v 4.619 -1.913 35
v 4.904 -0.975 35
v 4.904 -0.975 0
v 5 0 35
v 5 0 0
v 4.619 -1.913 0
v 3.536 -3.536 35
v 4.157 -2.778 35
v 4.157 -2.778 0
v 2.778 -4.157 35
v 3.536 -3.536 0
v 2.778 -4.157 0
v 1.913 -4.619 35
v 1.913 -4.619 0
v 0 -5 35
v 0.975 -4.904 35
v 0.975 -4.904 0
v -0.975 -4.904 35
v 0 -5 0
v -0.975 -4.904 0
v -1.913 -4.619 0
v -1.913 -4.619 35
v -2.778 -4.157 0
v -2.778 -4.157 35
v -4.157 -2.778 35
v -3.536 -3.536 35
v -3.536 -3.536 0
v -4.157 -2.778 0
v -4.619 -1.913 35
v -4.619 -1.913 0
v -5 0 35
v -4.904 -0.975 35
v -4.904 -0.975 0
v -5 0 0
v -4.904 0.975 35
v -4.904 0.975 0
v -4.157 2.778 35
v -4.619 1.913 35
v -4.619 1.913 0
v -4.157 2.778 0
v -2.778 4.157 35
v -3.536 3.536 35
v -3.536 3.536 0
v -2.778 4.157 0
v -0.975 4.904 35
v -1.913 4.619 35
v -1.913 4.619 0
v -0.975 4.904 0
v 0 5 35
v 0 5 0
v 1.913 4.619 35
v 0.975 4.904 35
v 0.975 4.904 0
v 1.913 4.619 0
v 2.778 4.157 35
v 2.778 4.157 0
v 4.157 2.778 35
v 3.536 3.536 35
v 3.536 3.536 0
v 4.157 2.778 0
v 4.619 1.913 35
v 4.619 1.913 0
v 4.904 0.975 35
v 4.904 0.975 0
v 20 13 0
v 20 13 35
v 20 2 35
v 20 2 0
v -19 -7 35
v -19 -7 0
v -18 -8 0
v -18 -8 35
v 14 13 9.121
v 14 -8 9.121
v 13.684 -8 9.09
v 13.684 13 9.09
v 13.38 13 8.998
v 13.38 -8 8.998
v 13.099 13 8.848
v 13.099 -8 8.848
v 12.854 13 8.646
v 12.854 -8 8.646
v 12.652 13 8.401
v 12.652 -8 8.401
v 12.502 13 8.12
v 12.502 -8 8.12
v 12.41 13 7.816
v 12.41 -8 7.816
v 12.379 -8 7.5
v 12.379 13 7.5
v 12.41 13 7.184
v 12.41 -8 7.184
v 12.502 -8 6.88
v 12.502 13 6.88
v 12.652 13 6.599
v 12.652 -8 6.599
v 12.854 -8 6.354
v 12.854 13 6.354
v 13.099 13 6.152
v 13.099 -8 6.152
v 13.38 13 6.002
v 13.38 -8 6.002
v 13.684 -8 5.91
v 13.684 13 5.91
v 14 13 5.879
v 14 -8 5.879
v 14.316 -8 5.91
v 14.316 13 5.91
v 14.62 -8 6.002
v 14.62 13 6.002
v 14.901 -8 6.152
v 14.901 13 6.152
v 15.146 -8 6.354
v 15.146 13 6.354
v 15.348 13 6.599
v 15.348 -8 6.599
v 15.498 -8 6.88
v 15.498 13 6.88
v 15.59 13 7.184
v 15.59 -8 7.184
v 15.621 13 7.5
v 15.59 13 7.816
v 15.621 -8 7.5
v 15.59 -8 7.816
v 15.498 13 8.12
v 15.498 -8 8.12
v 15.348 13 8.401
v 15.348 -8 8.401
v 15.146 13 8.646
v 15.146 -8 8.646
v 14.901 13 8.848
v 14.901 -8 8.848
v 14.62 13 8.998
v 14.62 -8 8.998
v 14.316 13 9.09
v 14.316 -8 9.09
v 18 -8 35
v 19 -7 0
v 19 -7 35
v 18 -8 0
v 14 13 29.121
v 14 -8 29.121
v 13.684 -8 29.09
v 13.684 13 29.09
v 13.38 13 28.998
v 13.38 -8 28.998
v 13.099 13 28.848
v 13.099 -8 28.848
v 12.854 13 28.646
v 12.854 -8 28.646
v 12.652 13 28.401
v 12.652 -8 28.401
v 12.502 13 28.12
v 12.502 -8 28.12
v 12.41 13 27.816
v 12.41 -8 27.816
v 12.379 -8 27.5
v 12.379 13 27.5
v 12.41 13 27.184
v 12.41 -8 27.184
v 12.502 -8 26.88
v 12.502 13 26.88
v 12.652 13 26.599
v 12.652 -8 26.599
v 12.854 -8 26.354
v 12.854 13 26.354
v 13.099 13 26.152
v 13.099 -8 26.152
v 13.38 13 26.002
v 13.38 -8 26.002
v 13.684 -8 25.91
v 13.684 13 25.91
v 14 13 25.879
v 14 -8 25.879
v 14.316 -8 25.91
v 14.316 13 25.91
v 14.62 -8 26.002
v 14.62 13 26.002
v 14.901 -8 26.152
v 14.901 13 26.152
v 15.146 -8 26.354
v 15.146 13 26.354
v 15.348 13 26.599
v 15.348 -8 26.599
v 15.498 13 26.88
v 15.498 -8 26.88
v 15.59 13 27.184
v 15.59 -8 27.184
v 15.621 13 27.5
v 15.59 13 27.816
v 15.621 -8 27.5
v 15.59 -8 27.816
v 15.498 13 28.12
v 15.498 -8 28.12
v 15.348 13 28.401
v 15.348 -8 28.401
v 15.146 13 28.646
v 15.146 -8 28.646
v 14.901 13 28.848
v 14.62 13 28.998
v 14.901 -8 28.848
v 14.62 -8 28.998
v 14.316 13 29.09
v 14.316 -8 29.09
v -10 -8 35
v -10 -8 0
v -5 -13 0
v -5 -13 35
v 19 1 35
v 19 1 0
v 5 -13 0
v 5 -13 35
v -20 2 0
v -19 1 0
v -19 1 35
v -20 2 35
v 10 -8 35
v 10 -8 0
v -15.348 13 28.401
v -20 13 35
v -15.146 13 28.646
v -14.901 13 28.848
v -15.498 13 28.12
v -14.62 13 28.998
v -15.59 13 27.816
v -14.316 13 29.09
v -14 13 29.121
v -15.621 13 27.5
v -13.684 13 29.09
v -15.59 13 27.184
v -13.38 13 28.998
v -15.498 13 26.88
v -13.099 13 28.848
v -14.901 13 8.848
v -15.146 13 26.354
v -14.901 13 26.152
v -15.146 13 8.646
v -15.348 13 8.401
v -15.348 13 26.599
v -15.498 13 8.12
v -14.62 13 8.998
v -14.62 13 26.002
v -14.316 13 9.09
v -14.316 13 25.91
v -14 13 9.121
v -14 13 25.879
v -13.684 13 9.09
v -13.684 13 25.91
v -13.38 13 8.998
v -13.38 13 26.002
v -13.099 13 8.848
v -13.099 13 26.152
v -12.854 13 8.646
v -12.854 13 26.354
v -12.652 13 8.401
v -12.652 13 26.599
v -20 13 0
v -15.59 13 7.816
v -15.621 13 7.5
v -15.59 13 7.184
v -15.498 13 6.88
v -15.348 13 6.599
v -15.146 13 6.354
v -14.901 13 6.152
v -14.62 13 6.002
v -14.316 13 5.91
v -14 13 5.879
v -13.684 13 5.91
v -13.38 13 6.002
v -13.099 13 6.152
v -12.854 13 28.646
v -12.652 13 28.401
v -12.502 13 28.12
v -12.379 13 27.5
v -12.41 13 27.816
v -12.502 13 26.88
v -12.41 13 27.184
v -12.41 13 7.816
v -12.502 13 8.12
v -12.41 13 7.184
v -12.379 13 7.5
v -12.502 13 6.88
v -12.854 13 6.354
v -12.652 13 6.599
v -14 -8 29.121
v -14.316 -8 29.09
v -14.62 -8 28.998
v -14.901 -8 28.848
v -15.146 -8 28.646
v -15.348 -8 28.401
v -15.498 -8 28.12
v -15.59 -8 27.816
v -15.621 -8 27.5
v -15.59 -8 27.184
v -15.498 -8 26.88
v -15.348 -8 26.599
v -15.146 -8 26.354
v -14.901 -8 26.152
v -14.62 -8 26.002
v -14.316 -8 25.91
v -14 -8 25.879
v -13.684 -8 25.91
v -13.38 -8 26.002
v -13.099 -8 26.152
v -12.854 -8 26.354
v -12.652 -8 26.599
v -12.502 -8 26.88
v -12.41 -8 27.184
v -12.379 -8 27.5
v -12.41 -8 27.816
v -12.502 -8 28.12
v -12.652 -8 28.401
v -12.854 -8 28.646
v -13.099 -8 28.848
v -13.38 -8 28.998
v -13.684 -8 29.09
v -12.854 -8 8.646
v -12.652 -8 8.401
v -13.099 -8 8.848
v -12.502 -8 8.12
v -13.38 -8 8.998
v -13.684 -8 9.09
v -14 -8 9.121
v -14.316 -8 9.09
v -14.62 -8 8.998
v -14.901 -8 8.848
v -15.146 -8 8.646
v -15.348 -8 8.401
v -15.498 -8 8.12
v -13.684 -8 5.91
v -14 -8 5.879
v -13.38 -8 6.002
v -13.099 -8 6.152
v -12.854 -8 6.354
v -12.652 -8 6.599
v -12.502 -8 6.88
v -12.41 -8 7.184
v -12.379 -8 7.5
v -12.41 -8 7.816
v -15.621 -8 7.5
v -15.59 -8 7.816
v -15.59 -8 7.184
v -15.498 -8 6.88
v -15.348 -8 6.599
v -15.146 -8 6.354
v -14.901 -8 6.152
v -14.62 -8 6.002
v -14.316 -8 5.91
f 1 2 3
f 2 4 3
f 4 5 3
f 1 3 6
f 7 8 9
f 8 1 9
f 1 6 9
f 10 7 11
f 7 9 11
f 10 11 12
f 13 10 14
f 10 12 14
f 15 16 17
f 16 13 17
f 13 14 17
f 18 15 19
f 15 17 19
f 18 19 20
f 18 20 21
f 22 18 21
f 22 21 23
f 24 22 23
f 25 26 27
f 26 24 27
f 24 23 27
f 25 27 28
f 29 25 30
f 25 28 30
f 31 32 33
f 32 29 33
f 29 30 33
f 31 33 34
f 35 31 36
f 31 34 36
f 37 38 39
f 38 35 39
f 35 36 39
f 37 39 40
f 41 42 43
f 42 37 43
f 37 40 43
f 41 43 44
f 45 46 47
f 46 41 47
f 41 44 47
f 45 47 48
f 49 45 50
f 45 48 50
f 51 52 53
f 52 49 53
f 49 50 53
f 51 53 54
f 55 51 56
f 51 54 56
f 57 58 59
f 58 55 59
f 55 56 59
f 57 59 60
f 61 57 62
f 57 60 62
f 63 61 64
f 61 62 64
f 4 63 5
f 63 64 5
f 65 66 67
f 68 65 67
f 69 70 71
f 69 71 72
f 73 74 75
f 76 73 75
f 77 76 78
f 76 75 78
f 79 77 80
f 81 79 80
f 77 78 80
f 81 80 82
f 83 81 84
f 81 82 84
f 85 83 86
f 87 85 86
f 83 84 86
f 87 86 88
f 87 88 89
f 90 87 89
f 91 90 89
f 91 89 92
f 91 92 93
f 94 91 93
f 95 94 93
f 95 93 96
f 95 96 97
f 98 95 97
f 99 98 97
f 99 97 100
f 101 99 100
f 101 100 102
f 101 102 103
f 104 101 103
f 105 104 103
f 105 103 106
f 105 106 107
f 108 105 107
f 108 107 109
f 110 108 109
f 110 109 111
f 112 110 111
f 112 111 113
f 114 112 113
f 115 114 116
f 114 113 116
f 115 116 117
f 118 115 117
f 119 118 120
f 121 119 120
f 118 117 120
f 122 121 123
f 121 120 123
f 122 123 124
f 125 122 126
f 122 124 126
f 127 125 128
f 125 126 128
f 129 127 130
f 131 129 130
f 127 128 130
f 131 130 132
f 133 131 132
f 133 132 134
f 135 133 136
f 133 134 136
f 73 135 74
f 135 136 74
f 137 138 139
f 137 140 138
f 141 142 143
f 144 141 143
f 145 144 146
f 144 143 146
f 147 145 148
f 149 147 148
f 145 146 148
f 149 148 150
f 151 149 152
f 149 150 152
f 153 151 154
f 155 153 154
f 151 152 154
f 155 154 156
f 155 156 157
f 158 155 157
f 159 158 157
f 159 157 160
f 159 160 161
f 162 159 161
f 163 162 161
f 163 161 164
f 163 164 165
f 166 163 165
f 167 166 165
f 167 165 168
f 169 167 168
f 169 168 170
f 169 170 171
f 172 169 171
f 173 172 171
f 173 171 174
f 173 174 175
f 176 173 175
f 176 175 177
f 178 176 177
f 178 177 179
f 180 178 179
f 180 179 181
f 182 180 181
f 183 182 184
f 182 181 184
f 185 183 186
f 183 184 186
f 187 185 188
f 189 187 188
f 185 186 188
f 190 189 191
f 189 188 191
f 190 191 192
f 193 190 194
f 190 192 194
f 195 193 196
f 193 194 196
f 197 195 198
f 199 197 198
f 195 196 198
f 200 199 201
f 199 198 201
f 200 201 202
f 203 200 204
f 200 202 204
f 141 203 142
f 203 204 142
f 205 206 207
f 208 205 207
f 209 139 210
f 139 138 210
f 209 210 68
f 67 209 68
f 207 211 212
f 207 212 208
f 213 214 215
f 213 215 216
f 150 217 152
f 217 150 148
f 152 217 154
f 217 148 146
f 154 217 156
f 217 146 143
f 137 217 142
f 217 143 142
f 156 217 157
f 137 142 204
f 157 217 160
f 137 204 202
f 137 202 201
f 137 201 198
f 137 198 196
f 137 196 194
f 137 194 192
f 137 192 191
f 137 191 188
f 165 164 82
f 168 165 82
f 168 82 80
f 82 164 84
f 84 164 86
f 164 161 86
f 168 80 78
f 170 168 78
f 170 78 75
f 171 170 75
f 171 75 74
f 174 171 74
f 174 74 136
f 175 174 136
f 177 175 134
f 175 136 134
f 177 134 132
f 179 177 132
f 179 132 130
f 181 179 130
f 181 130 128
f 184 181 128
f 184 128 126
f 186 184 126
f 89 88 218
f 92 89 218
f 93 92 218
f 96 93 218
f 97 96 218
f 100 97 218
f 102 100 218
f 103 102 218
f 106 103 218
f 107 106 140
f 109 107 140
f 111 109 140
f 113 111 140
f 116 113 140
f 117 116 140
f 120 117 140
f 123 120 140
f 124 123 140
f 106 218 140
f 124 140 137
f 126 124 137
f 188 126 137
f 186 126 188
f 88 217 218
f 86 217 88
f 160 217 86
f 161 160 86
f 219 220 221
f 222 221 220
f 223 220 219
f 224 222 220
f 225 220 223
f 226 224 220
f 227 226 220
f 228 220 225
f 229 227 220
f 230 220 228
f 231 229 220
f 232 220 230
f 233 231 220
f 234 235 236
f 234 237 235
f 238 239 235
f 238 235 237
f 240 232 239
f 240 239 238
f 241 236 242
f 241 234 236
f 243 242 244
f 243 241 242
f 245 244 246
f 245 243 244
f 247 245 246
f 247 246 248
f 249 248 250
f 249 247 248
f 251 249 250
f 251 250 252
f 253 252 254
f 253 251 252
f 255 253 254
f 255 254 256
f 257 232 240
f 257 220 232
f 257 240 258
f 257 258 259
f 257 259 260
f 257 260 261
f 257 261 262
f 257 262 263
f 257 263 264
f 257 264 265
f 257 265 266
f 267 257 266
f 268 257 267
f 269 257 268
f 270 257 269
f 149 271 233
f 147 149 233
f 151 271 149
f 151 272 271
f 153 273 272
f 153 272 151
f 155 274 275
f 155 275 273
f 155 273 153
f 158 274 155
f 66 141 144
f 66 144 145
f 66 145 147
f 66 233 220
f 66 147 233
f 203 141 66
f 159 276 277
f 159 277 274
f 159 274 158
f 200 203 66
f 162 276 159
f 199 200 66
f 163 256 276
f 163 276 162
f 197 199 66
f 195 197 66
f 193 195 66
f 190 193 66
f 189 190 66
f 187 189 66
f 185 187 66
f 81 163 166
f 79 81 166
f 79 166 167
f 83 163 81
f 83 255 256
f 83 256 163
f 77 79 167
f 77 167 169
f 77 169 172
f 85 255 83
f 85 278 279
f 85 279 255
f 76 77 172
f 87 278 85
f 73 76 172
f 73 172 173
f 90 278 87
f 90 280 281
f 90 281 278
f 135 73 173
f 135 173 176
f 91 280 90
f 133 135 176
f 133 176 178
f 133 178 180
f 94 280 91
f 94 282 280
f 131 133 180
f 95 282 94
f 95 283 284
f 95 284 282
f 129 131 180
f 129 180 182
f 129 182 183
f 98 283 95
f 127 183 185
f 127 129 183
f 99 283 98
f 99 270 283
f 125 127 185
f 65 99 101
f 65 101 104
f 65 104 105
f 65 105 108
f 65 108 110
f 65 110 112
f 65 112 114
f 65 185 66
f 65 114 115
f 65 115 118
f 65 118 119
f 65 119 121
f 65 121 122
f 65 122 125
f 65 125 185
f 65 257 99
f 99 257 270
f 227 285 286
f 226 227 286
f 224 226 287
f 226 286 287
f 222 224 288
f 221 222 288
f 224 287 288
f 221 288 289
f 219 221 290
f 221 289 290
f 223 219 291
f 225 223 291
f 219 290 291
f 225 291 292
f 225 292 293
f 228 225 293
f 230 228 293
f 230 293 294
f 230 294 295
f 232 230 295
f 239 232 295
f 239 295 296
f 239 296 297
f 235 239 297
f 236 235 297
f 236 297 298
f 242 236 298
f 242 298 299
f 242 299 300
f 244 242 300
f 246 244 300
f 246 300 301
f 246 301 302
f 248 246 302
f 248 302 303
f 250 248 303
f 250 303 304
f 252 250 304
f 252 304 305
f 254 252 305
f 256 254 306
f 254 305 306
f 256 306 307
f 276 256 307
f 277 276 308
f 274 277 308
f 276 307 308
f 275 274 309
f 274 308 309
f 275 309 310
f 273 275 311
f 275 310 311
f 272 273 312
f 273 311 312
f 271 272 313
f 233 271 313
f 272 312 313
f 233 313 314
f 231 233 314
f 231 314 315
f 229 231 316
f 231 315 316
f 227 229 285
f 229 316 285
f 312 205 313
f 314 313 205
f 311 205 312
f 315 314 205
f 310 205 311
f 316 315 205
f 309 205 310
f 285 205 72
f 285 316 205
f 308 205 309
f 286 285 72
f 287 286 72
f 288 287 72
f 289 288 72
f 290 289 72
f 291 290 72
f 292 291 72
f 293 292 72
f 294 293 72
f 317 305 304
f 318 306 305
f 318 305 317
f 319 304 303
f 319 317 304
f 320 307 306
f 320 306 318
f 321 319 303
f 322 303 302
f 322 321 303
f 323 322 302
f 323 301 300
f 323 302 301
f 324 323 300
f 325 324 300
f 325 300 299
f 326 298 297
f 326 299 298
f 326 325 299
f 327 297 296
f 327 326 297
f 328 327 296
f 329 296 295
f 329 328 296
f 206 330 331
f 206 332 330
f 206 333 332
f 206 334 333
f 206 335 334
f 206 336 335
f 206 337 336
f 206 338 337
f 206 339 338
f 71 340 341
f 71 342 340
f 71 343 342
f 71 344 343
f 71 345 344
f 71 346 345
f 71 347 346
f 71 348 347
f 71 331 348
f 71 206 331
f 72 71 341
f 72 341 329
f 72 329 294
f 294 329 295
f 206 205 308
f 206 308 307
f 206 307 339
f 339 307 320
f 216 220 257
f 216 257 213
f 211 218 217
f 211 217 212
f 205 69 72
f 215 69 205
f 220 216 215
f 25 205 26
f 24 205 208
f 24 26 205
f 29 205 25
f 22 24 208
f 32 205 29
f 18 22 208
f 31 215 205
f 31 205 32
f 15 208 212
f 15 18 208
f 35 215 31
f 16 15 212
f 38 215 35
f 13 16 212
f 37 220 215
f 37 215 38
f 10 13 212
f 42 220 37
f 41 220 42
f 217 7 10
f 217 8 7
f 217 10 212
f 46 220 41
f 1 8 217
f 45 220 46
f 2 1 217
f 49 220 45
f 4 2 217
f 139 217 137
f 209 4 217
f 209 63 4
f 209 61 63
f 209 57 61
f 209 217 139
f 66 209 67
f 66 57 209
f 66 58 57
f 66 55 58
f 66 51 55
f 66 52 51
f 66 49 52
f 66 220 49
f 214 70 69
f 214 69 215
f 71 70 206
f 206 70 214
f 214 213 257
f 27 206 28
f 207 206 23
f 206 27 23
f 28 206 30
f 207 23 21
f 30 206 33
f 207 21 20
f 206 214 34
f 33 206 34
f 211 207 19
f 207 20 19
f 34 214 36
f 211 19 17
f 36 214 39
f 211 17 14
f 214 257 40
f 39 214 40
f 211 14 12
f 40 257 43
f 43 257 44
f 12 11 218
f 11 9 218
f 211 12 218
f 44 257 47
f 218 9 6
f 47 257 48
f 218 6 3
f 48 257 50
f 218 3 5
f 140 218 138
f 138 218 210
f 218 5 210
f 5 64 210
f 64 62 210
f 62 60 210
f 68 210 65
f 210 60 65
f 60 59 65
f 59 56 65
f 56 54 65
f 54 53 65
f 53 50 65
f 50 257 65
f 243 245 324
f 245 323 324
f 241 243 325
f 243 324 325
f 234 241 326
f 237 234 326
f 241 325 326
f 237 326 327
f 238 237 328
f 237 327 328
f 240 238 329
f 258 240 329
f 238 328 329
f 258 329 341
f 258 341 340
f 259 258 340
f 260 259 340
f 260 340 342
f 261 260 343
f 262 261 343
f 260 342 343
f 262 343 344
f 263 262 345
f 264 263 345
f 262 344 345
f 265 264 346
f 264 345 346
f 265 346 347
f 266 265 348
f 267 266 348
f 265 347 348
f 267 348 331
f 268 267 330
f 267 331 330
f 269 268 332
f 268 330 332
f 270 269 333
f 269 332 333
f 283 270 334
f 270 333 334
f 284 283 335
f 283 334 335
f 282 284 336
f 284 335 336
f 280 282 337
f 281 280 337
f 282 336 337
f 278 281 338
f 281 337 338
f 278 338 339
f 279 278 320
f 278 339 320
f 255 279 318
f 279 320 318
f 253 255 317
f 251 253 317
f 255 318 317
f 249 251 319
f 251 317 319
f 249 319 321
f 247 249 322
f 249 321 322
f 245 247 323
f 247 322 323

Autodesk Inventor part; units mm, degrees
ref_plane "YZ Plane" through (0, 0, 0) normal (1, 0, 0) x (0, 1, 0)
ref_plane "XZ Plane" through (0, 0, 0) normal (0, 1, 0) x (-1, 0, 0)
ref_plane "XY Plane" through (0, 0, 0) normal (0, 0, 1) x (1, 0, 0)
sketch "Sketch1" plane through (0, 0, 0) normal (0, 0, 1) x (1, 0, 0)
  circle A0 centre (0, 0) radius 5
  circle A1 centre (0, 0) radius 8
  line L0 (0, 13) -> (20, 13)
  line L1 (20, 13) -> (20, 2)
  line L2 (10, -8) -> (5, -13)
  line L3 (5, -13) -> (0, -13)
  line L4 (10, -8) -> (19, -8)
  line L5 (19, -8) -> (19, 1)
  line L6 (19, 1) -> (20, 2)
  line L7 (0, 19.5854) -> (0, -21.9543) construction
  line L8 (0, 13) -> (-20, 13)
  line L9 (-20, 13) -> (-20, 2)
  line L10 (-10, -8) -> (-5, -13)
  line L11 (-5, -13) -> (0, -13)
  line L12 (-10, -8) -> (-19, -8)
  line L13 (-19, -8) -> (-19, 1)
  line L14 (-19, 1) -> (-20, 2)
  dimension "d0" = 10
  dimension "d8" = 16
  dimension "d27" = 20
  dimension "d28" = 0
  dimension "d29" = 0
  dimension "d30" = 135
  dimension "d31" = 26
  dimension "d32" = 13
  dimension "d34" = 21
  dimension "d35" = 135
  dimension "d36" = 12
  dimension "d37" = 19
  dimension "d38" = 5
  dimension "d39" = 0
extrude "Extrusion1" add sketch "Sketch1" along normal blind 35 contours A1 | L0 L1 L6 L5 L4 L2 L3 L11 L10 L12 L13 L14 L9 L8
chamfer "Chamfer1" distance 1 angle 45 2 edges at (19, -8, 17.5) (-19, -8, 17.5)
sketch "Sketch3" plane through (-20, 13, 0) normal (0, 1, 0) x (1, 0, 0)
  line L0 (40, 0) -> (0, 0) projected
  line L1 (0, 0) -> (0, -35) projected
  line L2 (40, -35) -> (0, -35) projected
  line L3 (40, 0) -> (40, -35) projected
  point P0 (20, 0)
  point P1 (6, -27.5)
  point P2 (6, -7.5)
  point P3 (34, -27.5)
  point P4 (34, -7.5)
  dimension "d45" = 20
  dimension "d48" = 28
  dimension "d51" = 6
  dimension "d52" = 7.5
hole "Hole2" at (-14, 13, 27.5) at (-14, 13, 7.5) at (14, 13, 27.5) at (14, 13, 7.5) direction (0, -1, 0) diameter 3.242 end through all thread size "M4x0.7" class "6H" standard "ANSI Metric M Profile"
properties part number "LinearBearing_SC10UU"
